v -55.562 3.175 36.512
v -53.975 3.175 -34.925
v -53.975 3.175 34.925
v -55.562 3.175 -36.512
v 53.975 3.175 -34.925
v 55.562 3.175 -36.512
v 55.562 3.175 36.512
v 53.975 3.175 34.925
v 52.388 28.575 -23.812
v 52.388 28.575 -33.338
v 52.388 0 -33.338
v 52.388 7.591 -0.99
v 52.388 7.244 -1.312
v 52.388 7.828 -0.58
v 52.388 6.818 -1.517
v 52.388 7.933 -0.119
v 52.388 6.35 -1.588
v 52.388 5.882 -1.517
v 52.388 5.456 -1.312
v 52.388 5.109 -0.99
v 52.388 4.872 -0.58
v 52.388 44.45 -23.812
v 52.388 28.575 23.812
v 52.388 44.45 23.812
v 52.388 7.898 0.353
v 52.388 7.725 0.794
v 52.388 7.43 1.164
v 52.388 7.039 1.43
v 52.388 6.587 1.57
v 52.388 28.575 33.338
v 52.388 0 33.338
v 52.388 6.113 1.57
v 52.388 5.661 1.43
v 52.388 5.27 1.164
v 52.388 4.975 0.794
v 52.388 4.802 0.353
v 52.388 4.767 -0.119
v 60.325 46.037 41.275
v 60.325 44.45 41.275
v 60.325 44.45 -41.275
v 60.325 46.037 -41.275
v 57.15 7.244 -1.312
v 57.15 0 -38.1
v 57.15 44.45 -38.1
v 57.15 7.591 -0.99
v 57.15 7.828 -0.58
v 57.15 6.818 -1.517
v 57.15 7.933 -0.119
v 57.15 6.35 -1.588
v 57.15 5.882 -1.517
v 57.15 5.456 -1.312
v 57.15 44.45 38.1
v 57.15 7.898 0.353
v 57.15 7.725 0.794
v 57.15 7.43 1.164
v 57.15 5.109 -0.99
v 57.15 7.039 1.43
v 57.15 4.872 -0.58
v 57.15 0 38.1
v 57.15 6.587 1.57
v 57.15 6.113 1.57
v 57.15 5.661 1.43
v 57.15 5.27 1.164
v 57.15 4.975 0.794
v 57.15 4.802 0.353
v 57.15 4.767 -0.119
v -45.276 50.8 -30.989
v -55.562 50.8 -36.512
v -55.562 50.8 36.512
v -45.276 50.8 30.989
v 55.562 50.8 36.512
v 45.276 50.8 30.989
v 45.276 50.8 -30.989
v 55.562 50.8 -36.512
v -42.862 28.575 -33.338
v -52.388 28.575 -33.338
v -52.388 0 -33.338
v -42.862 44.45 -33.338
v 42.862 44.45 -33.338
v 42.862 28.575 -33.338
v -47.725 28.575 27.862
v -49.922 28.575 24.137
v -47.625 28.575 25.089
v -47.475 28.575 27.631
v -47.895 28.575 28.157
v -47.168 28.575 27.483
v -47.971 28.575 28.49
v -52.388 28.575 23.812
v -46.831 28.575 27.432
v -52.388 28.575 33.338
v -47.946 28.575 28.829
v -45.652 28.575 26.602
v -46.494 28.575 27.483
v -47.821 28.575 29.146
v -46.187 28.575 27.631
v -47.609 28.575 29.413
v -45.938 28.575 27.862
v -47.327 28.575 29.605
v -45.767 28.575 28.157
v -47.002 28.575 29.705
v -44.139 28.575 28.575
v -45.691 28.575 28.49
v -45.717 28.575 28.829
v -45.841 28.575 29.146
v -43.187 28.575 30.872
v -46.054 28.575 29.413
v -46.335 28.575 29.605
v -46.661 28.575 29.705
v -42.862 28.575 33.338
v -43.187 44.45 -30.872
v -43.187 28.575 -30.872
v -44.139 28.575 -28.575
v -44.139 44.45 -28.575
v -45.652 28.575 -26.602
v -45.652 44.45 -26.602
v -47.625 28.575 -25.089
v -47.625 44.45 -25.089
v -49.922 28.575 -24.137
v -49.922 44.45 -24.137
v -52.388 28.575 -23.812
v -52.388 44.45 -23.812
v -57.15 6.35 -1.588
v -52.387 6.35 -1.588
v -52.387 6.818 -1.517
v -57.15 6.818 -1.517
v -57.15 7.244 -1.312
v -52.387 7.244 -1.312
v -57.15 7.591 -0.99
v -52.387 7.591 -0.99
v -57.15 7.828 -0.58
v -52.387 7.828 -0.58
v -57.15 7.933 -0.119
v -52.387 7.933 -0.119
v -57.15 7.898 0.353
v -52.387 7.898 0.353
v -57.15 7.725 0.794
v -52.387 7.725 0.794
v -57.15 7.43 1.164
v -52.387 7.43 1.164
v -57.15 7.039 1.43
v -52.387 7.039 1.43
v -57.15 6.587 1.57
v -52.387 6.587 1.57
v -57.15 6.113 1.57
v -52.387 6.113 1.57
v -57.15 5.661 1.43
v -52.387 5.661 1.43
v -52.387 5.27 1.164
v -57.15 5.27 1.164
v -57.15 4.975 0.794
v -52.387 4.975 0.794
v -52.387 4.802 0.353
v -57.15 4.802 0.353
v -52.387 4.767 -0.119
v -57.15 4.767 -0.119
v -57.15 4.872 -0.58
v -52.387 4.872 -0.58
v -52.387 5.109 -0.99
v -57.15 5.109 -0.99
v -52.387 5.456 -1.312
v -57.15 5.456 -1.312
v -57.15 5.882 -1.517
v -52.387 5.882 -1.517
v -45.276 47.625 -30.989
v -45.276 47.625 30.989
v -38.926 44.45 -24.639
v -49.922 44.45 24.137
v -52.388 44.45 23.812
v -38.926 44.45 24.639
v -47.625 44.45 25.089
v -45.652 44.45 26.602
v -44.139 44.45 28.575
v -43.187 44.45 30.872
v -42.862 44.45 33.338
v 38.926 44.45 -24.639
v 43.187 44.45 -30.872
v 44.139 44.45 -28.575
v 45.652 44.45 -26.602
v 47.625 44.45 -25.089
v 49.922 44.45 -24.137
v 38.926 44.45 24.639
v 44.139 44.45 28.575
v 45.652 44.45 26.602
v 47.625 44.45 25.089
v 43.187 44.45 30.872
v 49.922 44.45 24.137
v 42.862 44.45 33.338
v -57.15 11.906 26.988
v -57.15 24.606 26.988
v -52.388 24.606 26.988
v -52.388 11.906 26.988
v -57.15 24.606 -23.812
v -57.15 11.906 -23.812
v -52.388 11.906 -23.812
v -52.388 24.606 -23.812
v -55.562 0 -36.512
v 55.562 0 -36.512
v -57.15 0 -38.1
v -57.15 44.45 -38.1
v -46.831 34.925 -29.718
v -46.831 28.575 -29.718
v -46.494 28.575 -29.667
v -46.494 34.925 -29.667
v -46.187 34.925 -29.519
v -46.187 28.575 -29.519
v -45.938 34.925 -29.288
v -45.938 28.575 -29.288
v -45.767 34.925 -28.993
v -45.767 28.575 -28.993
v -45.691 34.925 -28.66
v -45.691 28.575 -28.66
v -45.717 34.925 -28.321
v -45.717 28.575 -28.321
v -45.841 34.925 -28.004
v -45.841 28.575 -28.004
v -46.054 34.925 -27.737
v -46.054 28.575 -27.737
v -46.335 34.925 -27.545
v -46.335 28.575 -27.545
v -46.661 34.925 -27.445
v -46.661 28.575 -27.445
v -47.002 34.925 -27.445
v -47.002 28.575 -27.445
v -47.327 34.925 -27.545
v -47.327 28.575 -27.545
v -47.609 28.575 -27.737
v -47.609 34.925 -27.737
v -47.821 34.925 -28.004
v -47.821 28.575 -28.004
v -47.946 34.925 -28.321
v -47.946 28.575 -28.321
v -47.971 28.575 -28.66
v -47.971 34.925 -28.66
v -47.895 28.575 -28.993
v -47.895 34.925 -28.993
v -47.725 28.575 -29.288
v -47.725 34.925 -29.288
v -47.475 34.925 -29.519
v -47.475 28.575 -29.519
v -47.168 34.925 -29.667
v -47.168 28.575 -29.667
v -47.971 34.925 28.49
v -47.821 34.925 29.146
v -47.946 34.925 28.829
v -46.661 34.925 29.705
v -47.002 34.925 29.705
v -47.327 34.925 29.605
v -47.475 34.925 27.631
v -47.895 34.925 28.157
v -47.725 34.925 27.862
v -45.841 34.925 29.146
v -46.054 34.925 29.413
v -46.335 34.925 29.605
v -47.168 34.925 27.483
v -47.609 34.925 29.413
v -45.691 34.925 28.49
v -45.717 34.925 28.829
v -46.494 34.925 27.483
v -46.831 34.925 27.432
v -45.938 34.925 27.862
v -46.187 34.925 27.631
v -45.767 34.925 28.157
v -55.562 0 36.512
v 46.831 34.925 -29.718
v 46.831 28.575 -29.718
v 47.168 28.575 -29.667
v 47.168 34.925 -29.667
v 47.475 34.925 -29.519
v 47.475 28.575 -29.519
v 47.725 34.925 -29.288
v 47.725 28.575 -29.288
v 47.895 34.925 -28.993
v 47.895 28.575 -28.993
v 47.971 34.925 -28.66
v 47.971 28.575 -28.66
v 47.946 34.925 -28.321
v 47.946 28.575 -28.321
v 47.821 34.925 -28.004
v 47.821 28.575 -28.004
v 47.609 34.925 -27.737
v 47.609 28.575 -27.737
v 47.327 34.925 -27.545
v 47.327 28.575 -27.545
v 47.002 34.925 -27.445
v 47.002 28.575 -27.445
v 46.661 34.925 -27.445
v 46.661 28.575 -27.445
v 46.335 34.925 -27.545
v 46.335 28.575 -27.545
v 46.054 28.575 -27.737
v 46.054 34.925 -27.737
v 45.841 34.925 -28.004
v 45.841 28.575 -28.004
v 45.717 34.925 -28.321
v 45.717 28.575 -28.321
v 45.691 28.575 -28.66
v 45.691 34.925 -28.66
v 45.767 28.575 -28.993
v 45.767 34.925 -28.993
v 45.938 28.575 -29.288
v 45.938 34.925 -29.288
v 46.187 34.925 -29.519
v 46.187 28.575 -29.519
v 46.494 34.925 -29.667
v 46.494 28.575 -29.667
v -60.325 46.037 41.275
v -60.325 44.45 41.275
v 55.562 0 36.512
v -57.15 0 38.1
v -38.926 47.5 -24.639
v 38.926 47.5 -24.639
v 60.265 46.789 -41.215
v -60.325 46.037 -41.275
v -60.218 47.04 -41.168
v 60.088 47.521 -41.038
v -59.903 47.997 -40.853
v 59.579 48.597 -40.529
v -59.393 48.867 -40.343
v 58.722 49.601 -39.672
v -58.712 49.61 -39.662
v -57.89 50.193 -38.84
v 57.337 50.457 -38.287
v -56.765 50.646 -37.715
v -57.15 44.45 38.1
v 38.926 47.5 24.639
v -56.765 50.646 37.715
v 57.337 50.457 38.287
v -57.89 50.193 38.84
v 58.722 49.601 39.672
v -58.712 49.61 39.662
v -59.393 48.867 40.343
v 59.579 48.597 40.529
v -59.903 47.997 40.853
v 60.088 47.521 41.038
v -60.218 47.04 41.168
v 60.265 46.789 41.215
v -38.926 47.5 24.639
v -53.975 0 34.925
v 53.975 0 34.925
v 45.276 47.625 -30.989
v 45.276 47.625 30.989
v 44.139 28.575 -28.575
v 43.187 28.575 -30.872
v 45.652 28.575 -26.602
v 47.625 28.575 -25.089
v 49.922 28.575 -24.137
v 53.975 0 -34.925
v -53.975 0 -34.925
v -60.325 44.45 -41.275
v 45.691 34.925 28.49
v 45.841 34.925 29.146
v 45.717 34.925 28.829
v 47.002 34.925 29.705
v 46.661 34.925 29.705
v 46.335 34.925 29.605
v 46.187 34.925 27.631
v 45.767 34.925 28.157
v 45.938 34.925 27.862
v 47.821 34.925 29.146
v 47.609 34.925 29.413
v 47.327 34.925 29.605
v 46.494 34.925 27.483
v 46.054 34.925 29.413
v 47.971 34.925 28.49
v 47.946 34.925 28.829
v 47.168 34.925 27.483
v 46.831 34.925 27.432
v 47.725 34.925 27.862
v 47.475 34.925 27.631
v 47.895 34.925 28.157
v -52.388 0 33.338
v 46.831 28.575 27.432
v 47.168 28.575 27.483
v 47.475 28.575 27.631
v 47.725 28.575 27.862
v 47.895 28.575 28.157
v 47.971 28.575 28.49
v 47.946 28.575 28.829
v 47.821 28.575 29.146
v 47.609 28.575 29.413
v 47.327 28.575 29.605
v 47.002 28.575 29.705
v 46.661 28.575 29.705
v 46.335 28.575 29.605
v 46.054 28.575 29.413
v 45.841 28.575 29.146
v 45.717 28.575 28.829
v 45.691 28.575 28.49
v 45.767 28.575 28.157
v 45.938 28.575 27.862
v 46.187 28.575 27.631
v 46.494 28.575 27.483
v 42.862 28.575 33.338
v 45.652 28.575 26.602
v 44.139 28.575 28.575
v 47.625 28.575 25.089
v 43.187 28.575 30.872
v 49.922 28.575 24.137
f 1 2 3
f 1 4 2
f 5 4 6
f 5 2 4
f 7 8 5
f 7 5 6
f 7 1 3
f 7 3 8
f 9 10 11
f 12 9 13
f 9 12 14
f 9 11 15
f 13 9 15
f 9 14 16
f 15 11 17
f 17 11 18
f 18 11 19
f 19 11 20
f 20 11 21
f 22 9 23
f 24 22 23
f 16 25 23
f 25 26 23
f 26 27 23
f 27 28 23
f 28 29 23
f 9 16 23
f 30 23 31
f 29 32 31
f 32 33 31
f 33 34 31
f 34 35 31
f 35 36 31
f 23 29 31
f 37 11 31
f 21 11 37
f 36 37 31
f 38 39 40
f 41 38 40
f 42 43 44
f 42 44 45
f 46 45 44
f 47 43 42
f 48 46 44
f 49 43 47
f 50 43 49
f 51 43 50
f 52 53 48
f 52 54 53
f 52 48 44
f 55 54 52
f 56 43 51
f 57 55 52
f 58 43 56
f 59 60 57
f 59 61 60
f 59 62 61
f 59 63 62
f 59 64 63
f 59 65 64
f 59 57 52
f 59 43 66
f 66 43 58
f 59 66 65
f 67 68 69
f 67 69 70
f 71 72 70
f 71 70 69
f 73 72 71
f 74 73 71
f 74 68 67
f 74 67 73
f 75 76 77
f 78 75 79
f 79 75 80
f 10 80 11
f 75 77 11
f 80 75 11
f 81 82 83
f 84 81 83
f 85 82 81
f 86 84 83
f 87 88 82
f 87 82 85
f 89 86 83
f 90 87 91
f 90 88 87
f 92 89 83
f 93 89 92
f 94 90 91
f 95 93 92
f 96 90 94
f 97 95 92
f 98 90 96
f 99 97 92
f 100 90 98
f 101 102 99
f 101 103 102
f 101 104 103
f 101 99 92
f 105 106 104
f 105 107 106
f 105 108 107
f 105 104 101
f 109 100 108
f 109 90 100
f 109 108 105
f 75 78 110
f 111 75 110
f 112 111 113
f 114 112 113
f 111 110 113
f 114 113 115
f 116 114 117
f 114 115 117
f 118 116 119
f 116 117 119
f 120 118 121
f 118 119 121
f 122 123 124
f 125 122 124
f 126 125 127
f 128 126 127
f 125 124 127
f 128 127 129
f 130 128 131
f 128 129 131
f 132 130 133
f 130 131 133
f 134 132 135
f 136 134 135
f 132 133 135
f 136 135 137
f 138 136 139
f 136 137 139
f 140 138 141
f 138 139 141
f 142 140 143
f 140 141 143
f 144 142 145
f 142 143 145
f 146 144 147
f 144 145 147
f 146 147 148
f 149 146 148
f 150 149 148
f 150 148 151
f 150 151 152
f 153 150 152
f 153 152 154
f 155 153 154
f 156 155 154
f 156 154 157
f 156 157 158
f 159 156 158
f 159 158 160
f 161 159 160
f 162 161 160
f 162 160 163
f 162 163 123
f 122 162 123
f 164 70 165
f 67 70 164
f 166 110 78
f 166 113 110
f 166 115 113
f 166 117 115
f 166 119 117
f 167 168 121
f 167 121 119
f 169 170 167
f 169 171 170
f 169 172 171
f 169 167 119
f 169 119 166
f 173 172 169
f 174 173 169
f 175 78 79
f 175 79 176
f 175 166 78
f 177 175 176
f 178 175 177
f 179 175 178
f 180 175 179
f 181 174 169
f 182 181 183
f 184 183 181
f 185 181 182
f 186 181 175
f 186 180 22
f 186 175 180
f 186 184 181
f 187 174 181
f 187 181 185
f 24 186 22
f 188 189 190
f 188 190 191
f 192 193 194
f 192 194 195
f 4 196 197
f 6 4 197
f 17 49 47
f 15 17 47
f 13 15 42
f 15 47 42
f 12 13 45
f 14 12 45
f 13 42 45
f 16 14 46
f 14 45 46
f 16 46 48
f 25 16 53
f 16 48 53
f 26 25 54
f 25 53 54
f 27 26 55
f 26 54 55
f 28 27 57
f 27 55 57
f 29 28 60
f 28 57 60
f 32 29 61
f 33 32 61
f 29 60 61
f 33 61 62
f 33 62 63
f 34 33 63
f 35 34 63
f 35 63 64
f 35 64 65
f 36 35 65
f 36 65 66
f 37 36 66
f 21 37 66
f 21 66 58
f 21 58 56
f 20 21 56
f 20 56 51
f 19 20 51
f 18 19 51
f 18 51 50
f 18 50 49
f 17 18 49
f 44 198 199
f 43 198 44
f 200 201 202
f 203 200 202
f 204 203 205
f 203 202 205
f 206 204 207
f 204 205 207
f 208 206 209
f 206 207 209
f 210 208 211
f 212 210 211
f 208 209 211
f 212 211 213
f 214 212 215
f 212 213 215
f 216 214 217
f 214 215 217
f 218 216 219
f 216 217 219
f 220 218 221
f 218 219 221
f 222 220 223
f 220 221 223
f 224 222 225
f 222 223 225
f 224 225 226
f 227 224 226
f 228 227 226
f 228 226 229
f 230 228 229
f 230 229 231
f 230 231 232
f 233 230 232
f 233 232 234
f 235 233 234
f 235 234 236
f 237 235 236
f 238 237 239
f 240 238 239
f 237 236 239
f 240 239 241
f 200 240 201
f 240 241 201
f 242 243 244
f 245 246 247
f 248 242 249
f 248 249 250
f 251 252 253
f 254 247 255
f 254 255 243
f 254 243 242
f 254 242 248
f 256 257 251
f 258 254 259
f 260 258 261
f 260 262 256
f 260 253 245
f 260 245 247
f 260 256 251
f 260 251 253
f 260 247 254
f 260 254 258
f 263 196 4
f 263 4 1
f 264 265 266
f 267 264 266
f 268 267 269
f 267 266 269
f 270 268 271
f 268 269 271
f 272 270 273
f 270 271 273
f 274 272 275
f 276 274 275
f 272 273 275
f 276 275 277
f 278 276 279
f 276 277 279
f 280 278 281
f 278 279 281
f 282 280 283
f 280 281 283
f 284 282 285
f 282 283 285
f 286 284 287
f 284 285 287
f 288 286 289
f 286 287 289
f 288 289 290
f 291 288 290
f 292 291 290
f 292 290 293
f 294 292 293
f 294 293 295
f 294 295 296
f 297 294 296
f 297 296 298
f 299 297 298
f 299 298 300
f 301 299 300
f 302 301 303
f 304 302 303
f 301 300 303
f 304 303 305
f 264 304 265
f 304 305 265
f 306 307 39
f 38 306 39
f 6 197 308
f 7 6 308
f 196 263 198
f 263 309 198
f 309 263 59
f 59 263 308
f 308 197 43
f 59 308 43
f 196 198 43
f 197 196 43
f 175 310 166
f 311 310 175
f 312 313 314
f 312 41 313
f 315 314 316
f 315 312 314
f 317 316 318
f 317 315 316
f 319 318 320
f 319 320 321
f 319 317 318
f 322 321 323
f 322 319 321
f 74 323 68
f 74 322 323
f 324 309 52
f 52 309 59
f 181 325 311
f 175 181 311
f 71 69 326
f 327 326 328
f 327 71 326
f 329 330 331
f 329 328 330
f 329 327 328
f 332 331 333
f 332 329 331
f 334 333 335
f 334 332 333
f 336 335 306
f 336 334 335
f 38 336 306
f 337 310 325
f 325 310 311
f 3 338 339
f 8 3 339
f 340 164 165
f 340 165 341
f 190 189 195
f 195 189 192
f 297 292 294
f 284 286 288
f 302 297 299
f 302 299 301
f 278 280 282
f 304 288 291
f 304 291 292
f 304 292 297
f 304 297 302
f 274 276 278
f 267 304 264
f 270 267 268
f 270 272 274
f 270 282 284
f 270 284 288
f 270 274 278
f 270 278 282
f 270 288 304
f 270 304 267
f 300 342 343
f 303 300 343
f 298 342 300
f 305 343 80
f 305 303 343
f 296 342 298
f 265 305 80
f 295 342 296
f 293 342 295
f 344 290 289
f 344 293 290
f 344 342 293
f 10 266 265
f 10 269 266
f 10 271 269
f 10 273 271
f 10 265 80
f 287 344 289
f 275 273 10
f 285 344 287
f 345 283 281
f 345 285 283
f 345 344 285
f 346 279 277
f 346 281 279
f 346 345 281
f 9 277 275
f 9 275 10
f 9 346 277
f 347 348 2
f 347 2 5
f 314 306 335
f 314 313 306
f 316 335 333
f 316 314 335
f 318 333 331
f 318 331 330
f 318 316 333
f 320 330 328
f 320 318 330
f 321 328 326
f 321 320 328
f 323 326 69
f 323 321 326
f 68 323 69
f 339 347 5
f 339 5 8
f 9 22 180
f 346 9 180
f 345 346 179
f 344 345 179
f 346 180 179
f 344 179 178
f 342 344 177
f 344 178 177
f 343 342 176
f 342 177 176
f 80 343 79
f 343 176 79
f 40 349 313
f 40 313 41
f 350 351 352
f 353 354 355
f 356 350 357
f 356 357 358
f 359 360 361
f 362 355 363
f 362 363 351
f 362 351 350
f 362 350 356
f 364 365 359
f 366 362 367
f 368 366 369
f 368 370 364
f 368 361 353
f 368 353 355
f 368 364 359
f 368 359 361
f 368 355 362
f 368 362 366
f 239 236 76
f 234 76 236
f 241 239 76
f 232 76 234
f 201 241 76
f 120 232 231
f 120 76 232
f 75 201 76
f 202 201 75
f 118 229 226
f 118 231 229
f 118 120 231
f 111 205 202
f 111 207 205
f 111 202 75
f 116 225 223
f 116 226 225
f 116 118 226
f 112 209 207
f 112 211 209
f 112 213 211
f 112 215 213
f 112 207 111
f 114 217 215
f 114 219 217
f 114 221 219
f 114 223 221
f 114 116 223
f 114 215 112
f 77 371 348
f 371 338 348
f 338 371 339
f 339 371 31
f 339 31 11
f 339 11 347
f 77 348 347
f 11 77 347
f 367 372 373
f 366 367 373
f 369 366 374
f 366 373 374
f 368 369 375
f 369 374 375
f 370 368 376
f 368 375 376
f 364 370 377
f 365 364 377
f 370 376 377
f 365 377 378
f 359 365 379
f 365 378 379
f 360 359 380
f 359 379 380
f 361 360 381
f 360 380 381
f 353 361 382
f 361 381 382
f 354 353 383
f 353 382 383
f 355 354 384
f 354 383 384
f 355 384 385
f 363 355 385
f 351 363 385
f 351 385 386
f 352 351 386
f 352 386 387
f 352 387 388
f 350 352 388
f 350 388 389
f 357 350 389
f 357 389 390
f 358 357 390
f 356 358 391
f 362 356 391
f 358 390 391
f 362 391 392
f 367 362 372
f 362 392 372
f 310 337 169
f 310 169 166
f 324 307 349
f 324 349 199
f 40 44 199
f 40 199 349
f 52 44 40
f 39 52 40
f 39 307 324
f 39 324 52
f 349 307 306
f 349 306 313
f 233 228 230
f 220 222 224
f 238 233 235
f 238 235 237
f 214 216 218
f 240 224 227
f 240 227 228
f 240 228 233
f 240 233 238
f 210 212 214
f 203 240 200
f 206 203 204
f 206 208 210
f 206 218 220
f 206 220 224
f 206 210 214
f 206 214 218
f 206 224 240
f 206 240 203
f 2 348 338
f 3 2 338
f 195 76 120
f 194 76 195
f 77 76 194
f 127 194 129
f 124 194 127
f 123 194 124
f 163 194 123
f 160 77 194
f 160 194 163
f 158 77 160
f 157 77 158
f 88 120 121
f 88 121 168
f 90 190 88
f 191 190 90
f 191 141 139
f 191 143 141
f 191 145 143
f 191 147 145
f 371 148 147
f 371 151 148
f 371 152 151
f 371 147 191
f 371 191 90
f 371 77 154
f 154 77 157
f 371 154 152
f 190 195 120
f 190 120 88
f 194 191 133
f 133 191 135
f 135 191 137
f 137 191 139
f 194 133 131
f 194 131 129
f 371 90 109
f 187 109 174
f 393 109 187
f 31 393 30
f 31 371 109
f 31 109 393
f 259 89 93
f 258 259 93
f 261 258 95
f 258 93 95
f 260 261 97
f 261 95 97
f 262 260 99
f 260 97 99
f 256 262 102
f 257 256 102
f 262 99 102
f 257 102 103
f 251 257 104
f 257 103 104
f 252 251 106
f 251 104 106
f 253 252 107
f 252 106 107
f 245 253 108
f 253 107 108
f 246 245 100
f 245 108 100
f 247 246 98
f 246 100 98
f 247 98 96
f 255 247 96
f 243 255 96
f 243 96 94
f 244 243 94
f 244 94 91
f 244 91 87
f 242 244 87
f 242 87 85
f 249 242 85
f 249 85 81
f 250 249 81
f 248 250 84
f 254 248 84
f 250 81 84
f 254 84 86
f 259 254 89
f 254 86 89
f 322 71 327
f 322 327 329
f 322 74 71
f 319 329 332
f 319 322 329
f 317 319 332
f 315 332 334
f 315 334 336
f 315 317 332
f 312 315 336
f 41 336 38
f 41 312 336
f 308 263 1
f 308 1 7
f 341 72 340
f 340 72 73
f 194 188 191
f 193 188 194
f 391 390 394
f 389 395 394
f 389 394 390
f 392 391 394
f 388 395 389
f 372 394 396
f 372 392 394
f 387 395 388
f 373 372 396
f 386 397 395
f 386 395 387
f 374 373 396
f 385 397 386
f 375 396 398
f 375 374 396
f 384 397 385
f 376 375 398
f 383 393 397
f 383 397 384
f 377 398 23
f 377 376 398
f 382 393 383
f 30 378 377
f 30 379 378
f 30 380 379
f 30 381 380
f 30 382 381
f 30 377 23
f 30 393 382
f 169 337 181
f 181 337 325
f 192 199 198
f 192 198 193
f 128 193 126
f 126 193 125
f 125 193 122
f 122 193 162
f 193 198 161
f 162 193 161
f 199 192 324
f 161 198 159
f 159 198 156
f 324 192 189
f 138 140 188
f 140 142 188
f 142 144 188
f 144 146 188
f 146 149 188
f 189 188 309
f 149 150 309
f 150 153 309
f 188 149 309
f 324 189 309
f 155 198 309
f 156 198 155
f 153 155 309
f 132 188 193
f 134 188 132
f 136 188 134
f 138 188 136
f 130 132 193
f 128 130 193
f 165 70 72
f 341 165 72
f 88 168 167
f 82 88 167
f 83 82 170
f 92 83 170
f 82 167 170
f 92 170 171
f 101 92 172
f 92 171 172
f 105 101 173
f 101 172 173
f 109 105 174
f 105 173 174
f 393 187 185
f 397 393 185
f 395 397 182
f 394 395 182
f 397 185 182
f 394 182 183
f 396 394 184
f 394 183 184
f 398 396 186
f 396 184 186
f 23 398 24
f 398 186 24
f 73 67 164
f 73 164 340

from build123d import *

# Parameters (mm, degrees)
SKETCH1_W                                 = 120.65
SKETCH1_H                                 = 82.55
MAINBODY_DEPTH                            = 50.8
SKETCH2_W                                 = 90.552524
SKETCH2_H                                 = 61.977524
SOLARPANELRECESS_DEPTH                    = 3.175
SKETCH3_W                                 = 77.852524
SKETCH3_H                                 = 49.277524
SOLARPANELWIRINGRECESS_DEPTH              = 88.240311067
SKETCH4_W                                 = 127
SKETCH4_H                                 = 88.9
SKETCH4_W_2                               = 120.65
SKETCH4_H_2                               = 82.55
SKETCH4_W_3                               = 114.3
SKETCH4_H_3                               = 76.2
SKETCH4_W_4                               = 104.775
SKETCH4_H_4                               = 66.675
SKETCH4_W_5                               = 77.852524
SKETCH4_H_5                               = 49.277524
INSIDEENCLOSURERECESS_OUTSIDEFLANGE_DEPTH = 44.45
TOPFANCYFILLET_R                          = 4.7625
CABLEACCESS_REACH                         = 136.479
SKETCH9_R                                 = 1.5875
TOPEDGEHOLES_DEPTH                        = 135.479148012
CORNERSTANDOFFS_DEPTH                     = 15.875
SKETCH11_R                                = 1.143
SCREWSTANDOFFHOLES_DEPTH                  = 6.35
SKETCH12_W                                = 111.125
SKETCH12_H                                = 73.025
SKETCH12_W_2                              = 107.95
SKETCH12_H_2                              = 69.85
WEATHERSEALRECESS_DEPTH                   = 3.175
SKETCH13_W                                = 90.552524
SKETCH13_H                                = 61.977524
BLANKINSERT_BETTERBRIDGING_DEPTH          = 0.125


with BuildPart() as part:
    # Sketch1 → MainBody (new body)
    with BuildSketch(Plane(origin=(0, 0, 0), x_dir=(1, 0, 0), z_dir=(0, 1, 0))):
        Rectangle(SKETCH1_W, SKETCH1_H)
    extrude(amount=MAINBODY_DEPTH)

    # Sketch2 → SolarPanelRecess (cut)
    with BuildSketch(Plane(origin=(0, 50.8, 0), x_dir=(1, 0, 0), z_dir=(0, 1, 0))):
        Rectangle(SKETCH2_W, SKETCH2_H)
    extrude(amount=-SOLARPANELRECESS_DEPTH, mode=Mode.SUBTRACT)

    # Sketch3 → SolarPanelWiringRecess (cut, through all)
    with BuildSketch(Plane(origin=(0, 47.625, 0), x_dir=(1, 0, 0), z_dir=(0, 1, 0))):
        Rectangle(SKETCH3_W, SKETCH3_H)
    extrude(amount=-SOLARPANELWIRINGRECESS_DEPTH, mode=Mode.SUBTRACT)

    # Sketch4 → InsideEnclosureRecess_OutsideFlange (cut)
    with BuildSketch(Plane.XZ):
        Rectangle(SKETCH4_W, SKETCH4_H)
        Rectangle(SKETCH4_W_2, SKETCH4_H_2, mode=Mode.SUBTRACT)
        Rectangle(SKETCH4_W_2, SKETCH4_H_2)
        Rectangle(SKETCH4_W_3, SKETCH4_H_3, mode=Mode.SUBTRACT)
        Rectangle(SKETCH4_W_4, SKETCH4_H_4)
        Rectangle(SKETCH4_W_5, SKETCH4_H_5, mode=Mode.SUBTRACT)
    extrude(amount=-INSIDEENCLOSURERECESS_OUTSIDEFLANGE_DEPTH, mode=Mode.SUBTRACT)

    # TopFancyFillet
    topfancyfillet_edges = [part.edges().sort_by_distance(p)[0] for p in [
        (-60.325, 50.8, 0),
        (0, 50.8, 41.275),
        (60.325, 50.8, 0),
        (0, 50.8, -41.275),
    ]]
    fillet(topfancyfillet_edges, radius=TOPFANCYFILLET_R)

    # Sketch6 → CableAccess (cut, up to next)
    with BuildSketch(Plane.ZY.offset(57.15), mode=Mode.PRIVATE) as cableaccess_sk1:
        Polygon((-14.2875, 24.60625), (14.2875, 24.60625), (26.9875, 24.60625), (26.9875, 11.90625), (-23.8125, 11.90625), (-23.8125, 24.60625), align=None)
    cableaccess_tool1 = extrude(cableaccess_sk1.sketch, amount=-CABLEACCESS_REACH, mode=Mode.PRIVATE) & part.part
    add(cableaccess_tool1.solids().sort_by_distance((-57.15, 18.25625, 1.5875))[0], mode=Mode.SUBTRACT)

    # Sketch9 → TopEdgeHoles (cut, through all)
    with BuildSketch(Plane(origin=(57.15, 0, 0), x_dir=(0, 0, -1), z_dir=(1, 0, 0))):
        with Locations((0, 6.35)):
            Circle(SKETCH9_R)
    extrude(amount=-TOPEDGEHOLES_DEPTH, mode=Mode.SUBTRACT)

    # Sketch10 → CornerStandoffs (add)
    with BuildSketch(Plane.XZ.offset(-44.45)):
        with BuildLine():
            Line((-42.8625, 33.3375), (-52.3875, 33.3375))
            Line((-52.3875, 33.3375), (-52.3875, 23.8125))
            ThreePointArc((-52.3875, 23.8125), (-45.652307909, 26.602307909), (-42.8625, 33.3375))
        make_face()
        with BuildLine():
            ThreePointArc((-42.8625, -33.3375), (-45.652307909, -26.602307909), (-52.3875, -23.8125))
            Line((-52.3875, -23.8125), (-52.3875, -33.3375))
            Line((-52.3875, -33.3375), (-42.8625, -33.3375))
        make_face()
        with BuildLine():
            Line((52.3875, 33.3375), (42.8625, 33.3375))
            ThreePointArc((42.8625, 33.3375), (45.652307909, 26.602307909), (52.3875, 23.8125))
            Line((52.3875, 23.8125), (52.3875, 33.3375))
        make_face()
        with BuildLine():
            ThreePointArc((52.3875, -23.8125), (45.652307909, -26.602307909), (42.8625, -33.3375))
            Line((42.8625, -33.3375), (52.3875, -33.3375))
            Line((52.3875, -33.3375), (52.3875, -23.8125))
        make_face()
    extrude(amount=CORNERSTANDOFFS_DEPTH)

    # Sketch11 → ScrewStandoffHoles (cut)
    with BuildSketch(Plane.XZ.offset(-28.575)):
        with Locations(Location((46.83125, -28.575, 0), (0, 0, 270))):
            Circle(SKETCH11_R)
        with Locations(Location((-46.83125, -28.575, 0), (0, 0, 270))):
            Circle(SKETCH11_R)
        with Locations(Location((-46.83125, 28.575, 0), (0, 0, 270))):
            Circle(SKETCH11_R)
        with Locations(Location((46.83125, 28.575, 0), (0, 0, 270))):
            Circle(SKETCH11_R)
    extrude(amount=-SCREWSTANDOFFHOLES_DEPTH, mode=Mode.SUBTRACT)

    # Sketch12 → WeatherSealRecess (cut)
    with BuildSketch(Plane.XZ):
        Rectangle(SKETCH12_W, SKETCH12_H)
        Rectangle(SKETCH12_W_2, SKETCH12_H_2, mode=Mode.SUBTRACT)
    extrude(amount=-WEATHERSEALRECESS_DEPTH, mode=Mode.SUBTRACT)

    # Sketch13 → BlankInsert_BetterBridging (add)
    with BuildSketch(Plane(origin=(0, 47.625, 0), x_dir=(1, 0, 0), z_dir=(0, 1, 0))):
        Rectangle(SKETCH13_W, SKETCH13_H)
    extrude(amount=-BLANKINSERT_BETTERBRIDGING_DEPTH)


solid = part.part
